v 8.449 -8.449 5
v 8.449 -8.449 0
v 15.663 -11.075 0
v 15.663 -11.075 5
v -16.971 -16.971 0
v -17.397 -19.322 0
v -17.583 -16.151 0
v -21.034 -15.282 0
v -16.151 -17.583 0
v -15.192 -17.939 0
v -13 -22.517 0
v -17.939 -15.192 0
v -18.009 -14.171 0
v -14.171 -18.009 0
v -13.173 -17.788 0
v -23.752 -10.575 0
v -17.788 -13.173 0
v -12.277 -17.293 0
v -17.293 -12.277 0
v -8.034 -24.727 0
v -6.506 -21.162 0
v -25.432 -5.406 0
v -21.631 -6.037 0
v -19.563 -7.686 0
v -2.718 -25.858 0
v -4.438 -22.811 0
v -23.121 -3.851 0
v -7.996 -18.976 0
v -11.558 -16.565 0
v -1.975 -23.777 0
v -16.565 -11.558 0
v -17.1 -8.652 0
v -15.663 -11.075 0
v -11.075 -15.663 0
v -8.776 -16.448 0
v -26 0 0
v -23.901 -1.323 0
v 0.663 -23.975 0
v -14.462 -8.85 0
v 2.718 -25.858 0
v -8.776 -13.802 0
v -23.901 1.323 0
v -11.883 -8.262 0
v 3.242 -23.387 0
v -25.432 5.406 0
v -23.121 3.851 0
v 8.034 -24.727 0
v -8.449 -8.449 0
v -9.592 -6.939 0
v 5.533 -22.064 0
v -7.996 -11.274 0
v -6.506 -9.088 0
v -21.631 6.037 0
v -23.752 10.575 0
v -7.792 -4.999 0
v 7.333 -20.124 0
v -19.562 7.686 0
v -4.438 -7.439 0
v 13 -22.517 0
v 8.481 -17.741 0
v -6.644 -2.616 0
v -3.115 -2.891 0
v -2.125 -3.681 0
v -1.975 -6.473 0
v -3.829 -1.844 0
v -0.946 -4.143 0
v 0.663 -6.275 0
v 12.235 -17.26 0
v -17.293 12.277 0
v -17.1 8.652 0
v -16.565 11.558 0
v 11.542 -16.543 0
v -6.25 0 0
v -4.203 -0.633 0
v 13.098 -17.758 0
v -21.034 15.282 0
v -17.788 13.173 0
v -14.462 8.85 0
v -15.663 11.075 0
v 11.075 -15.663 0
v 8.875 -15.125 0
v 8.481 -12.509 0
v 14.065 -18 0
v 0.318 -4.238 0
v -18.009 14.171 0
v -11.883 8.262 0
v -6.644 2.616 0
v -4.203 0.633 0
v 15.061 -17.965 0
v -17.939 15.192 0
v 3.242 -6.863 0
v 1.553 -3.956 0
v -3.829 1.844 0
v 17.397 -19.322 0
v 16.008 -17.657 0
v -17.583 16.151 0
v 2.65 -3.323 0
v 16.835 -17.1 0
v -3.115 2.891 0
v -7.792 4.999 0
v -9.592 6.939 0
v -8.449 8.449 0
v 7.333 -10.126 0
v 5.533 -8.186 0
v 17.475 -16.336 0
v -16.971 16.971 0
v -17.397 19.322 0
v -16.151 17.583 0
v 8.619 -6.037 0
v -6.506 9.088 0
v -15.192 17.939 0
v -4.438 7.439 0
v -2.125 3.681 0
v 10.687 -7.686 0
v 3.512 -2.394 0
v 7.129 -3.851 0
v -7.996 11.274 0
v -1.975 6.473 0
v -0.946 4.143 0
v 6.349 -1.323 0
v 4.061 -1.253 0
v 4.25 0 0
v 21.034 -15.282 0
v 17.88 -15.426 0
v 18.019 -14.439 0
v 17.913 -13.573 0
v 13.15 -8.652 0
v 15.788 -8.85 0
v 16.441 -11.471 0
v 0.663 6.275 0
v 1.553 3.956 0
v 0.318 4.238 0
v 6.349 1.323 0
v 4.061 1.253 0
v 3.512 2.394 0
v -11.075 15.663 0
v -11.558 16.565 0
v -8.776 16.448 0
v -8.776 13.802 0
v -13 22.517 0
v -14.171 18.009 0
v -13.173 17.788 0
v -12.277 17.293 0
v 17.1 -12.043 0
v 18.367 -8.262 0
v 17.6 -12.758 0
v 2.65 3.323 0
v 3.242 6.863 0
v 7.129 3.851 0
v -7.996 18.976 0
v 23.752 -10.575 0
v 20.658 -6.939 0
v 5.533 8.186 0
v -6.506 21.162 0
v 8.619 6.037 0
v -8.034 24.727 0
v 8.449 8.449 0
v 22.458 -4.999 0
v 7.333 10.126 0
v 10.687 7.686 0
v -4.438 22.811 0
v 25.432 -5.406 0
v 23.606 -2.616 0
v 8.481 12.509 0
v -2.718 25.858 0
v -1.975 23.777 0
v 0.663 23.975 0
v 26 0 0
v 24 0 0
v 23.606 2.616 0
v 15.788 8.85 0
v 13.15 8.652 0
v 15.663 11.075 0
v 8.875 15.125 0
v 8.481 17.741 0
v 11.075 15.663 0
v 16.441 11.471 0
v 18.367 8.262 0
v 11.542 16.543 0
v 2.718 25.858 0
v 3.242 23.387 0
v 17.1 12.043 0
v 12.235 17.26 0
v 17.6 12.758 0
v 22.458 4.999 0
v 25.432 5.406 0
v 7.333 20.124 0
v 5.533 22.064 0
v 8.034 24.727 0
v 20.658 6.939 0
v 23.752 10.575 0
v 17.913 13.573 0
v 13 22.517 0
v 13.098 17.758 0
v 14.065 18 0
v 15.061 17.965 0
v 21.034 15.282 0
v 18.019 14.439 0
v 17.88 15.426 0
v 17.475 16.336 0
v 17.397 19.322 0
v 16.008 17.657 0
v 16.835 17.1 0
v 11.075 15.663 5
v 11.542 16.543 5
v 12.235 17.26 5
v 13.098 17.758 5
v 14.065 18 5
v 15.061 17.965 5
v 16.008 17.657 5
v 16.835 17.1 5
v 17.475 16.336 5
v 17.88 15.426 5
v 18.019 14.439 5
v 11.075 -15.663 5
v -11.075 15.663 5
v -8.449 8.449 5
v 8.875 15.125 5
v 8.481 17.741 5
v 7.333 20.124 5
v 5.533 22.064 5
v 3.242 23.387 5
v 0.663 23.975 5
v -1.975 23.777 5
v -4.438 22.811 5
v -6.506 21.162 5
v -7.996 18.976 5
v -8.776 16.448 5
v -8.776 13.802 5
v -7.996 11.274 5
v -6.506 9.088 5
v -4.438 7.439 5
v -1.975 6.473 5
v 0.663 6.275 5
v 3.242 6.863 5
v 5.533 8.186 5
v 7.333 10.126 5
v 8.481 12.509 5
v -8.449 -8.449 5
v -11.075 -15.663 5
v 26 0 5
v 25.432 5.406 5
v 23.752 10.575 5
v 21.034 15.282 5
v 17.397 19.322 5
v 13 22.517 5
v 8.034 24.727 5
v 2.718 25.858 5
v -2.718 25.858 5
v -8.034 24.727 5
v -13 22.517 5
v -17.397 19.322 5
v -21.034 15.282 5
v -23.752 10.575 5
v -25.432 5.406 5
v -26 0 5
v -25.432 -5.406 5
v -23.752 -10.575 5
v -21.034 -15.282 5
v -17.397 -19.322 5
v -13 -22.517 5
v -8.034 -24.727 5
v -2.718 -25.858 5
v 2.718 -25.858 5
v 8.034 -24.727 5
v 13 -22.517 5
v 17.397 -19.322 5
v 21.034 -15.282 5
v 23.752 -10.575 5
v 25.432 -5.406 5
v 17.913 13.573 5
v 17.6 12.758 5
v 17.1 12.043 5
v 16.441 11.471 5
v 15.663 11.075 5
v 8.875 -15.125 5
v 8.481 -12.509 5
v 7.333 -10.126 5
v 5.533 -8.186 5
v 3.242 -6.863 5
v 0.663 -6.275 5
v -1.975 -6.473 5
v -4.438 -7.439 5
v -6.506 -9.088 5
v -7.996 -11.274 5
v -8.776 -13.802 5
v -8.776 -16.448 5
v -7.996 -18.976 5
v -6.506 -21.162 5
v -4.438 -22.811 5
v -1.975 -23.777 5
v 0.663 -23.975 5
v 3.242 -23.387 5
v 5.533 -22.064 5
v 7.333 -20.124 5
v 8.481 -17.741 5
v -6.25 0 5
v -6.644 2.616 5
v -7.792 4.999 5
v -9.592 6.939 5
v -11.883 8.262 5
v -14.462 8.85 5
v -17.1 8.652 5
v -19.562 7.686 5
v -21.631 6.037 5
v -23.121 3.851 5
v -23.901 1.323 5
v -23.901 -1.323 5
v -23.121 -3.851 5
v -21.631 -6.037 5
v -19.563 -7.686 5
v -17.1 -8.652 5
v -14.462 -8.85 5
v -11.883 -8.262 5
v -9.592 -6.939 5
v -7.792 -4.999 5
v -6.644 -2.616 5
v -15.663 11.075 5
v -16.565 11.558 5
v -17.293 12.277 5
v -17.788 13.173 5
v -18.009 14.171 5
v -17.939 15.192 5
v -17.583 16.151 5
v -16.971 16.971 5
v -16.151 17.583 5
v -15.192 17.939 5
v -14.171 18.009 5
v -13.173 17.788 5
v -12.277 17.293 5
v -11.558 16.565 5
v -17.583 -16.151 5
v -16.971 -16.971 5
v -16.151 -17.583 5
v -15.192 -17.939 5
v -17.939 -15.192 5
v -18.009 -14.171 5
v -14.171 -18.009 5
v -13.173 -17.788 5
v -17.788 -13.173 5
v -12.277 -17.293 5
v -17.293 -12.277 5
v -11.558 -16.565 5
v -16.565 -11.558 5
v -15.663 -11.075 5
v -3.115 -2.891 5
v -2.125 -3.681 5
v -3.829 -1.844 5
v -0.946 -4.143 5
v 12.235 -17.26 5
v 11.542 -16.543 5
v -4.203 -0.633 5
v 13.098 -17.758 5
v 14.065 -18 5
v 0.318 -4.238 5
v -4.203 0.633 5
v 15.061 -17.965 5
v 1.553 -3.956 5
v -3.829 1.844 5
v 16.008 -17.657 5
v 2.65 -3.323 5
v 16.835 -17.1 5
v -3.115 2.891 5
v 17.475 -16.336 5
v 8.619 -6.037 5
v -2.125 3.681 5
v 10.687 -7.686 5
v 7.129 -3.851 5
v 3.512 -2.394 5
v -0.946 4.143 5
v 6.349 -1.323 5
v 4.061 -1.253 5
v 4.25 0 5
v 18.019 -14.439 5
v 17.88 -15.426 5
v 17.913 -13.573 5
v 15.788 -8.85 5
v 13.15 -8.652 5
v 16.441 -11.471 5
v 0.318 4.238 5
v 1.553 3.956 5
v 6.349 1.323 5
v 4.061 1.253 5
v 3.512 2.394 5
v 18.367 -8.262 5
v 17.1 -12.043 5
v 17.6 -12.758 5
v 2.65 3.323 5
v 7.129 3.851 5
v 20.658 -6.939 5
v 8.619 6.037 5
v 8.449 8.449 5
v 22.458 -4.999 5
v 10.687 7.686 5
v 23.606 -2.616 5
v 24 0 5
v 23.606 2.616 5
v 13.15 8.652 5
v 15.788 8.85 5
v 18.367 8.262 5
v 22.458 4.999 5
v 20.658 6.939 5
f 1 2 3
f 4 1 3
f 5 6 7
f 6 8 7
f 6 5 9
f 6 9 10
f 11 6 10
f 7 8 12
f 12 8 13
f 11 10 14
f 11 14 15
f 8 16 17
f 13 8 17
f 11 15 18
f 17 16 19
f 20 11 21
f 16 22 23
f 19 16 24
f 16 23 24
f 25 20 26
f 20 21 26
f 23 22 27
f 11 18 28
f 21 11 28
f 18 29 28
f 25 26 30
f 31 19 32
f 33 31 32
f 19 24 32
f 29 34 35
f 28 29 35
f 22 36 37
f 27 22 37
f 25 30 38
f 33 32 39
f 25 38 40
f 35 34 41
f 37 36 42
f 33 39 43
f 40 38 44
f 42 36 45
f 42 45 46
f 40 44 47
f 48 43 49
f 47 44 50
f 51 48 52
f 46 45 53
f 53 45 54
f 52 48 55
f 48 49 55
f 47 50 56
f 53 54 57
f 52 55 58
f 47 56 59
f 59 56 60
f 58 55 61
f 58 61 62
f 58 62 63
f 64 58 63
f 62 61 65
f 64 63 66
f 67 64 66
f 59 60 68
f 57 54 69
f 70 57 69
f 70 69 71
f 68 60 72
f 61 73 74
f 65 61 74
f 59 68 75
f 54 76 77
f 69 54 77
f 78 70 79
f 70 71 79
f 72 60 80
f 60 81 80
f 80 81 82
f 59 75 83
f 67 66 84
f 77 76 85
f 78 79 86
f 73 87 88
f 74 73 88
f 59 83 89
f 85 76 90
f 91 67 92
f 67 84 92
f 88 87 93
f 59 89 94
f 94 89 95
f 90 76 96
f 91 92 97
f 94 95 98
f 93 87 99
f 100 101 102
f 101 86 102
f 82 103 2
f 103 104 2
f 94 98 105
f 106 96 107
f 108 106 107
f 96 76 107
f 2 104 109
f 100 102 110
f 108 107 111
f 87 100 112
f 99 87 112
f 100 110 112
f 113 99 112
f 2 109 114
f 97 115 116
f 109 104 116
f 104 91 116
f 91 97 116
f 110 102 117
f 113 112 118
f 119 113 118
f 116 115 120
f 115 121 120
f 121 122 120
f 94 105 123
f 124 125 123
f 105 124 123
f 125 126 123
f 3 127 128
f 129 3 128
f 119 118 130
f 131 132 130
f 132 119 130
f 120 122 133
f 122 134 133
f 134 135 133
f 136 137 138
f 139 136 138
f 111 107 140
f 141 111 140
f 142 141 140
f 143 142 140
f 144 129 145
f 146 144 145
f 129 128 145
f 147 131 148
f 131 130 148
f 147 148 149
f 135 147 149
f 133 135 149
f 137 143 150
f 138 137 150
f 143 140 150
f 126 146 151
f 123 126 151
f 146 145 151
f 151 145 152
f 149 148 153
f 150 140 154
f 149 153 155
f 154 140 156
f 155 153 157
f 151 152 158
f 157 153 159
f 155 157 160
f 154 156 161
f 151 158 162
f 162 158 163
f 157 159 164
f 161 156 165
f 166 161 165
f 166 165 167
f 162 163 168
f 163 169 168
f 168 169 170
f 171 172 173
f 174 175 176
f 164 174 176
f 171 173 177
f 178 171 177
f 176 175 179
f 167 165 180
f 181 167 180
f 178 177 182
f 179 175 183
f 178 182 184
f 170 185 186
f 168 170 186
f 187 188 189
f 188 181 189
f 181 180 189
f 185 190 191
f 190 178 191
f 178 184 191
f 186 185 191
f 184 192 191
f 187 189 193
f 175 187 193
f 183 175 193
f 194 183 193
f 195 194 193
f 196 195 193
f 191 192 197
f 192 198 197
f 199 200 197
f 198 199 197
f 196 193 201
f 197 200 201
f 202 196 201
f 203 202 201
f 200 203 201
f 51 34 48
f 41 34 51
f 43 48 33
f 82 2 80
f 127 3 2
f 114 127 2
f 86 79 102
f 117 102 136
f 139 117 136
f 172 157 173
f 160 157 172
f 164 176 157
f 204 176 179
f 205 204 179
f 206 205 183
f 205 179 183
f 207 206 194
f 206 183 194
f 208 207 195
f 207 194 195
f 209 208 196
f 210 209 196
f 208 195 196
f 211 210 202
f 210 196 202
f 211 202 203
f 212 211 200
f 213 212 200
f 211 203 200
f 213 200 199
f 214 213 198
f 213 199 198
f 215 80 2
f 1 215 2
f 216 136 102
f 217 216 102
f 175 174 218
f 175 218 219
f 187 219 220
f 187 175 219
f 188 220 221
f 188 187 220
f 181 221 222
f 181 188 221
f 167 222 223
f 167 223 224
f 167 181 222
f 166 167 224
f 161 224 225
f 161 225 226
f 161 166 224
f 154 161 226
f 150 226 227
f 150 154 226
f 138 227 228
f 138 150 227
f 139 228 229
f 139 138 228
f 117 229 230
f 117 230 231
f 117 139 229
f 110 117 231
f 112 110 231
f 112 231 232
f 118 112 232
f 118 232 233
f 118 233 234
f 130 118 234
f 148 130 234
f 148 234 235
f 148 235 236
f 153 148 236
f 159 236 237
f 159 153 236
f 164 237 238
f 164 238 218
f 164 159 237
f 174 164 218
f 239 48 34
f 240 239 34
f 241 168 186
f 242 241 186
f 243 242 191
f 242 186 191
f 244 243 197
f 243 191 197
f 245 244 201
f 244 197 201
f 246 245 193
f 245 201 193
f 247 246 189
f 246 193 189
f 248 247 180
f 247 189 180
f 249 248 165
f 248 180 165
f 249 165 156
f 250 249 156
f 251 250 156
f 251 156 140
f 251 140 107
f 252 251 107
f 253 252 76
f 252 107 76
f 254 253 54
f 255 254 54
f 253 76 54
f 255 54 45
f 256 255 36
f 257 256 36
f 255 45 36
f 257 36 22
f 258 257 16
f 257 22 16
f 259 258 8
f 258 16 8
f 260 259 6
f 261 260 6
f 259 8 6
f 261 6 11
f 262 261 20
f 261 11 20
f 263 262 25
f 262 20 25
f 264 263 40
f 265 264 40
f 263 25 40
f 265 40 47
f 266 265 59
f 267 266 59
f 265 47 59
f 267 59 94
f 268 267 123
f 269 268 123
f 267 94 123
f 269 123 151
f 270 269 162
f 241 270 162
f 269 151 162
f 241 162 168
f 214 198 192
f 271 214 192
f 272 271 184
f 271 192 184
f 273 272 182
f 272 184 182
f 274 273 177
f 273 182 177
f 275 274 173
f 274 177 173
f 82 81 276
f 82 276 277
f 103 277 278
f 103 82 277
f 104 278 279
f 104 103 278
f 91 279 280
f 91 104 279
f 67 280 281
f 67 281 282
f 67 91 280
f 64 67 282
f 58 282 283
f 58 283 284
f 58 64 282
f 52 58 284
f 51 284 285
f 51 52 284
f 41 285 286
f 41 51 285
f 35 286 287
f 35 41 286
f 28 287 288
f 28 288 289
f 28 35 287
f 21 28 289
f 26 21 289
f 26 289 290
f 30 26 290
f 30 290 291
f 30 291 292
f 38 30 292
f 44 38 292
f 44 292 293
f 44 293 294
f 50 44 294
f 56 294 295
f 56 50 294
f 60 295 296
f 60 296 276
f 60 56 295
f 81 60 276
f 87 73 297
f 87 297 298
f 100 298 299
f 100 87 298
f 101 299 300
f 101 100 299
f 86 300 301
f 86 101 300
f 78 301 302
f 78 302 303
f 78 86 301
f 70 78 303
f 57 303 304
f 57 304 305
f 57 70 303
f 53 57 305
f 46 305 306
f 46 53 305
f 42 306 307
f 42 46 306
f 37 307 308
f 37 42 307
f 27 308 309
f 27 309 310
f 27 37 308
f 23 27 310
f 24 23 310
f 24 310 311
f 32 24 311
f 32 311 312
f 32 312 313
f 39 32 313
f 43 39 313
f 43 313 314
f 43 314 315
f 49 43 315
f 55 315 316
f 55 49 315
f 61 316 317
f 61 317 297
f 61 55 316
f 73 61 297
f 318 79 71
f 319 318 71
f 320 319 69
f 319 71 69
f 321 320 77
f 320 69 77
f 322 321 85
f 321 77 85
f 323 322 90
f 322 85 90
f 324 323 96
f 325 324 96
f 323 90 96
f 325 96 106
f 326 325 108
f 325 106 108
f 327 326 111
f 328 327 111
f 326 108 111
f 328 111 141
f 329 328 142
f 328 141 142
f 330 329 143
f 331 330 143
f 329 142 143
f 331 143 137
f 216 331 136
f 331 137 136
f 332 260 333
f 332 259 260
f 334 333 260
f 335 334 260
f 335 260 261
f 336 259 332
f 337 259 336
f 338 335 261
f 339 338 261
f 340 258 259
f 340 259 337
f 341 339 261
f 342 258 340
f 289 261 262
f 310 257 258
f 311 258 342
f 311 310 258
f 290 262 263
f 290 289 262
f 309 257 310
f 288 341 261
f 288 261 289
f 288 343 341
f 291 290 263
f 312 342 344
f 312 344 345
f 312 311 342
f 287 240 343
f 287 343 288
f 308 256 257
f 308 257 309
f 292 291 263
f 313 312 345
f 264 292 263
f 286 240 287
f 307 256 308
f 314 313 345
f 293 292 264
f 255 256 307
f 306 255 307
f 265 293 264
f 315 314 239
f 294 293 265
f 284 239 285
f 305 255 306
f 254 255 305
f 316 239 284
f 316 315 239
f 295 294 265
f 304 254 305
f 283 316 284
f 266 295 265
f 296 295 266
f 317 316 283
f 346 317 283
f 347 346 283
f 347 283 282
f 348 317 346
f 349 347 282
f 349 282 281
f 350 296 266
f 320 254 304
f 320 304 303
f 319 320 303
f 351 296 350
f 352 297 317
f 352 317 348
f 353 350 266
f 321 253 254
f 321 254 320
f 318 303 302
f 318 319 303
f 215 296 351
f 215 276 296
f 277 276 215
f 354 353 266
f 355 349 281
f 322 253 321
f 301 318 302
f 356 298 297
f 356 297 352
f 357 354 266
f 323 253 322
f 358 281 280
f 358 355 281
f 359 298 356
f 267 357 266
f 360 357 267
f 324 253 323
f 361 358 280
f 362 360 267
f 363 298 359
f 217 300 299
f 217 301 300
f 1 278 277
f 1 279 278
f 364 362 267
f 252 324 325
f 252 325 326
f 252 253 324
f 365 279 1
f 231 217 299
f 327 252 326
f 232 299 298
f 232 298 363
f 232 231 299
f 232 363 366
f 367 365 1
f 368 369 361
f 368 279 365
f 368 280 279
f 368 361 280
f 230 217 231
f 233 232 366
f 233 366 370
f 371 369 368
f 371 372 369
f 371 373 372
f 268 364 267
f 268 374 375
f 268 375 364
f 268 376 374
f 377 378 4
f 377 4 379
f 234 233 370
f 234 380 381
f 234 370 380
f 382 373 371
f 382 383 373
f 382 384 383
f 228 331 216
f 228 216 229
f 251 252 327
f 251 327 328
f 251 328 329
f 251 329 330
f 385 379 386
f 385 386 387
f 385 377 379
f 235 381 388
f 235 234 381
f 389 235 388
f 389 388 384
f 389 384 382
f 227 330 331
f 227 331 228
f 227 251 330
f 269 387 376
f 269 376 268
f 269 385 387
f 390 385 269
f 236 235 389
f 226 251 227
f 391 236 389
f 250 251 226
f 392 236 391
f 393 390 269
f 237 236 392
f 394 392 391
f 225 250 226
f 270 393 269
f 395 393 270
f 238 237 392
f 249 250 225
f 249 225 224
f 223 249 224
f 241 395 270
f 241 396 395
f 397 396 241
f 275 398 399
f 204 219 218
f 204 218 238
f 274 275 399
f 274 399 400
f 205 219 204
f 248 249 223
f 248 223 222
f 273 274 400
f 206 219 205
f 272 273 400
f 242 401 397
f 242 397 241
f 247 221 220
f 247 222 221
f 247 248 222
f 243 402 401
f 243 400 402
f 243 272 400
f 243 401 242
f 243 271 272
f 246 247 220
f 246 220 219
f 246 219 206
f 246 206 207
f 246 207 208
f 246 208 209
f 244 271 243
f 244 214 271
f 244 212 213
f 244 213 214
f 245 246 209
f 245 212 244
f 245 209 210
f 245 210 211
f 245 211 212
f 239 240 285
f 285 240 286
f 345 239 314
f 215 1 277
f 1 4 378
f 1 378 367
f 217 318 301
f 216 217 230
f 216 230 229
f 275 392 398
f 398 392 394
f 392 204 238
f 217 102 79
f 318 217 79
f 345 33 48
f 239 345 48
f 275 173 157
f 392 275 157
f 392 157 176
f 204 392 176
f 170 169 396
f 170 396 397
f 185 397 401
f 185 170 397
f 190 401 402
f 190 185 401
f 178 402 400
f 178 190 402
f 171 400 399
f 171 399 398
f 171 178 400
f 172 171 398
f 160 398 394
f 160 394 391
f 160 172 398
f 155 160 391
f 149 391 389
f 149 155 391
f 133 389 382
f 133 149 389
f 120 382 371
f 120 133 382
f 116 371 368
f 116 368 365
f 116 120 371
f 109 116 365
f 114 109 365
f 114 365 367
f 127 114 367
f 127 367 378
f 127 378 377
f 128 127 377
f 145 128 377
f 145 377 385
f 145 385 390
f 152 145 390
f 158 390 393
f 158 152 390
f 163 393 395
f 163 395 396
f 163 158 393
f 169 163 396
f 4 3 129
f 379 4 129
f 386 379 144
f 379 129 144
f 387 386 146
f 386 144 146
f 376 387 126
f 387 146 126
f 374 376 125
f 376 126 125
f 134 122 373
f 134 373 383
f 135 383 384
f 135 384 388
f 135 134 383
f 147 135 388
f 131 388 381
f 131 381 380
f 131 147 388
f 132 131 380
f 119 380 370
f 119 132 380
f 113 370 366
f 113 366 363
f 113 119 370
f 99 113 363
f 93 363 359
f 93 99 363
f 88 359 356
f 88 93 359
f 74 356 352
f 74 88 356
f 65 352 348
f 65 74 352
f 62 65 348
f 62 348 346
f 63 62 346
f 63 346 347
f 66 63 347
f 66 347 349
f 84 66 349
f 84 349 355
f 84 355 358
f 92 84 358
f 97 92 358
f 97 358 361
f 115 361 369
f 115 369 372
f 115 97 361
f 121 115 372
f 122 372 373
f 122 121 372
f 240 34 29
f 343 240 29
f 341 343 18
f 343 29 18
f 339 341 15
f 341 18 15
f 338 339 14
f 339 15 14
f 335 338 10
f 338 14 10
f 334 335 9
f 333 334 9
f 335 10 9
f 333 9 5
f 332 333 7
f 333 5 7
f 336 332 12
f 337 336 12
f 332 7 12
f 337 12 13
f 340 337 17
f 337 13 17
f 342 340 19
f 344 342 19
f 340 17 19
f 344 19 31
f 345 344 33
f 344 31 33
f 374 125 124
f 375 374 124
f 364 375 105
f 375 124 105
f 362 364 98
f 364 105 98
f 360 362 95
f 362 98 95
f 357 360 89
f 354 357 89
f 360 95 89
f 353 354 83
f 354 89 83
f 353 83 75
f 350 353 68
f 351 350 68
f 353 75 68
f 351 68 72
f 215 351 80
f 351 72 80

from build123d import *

# Parameters (mm, degrees)
F0_R     = 26
F0_R_2   = 8.875
F0_R_3   = 4.25
F1_DEPTH = 5


with BuildPart() as f1:
    # F0 (on Top) → F1 (new body)
    with BuildSketch(Plane.XY):
        Circle(F0_R)
        with BuildLine():
            ThreePointArc((-11.074626, -15.663465), (-16.970563, -16.970563), (-15.663465, -11.074626))
            Line((-15.663465, -11.074626), (-8.448647, -8.448647))
            Line((-8.448647, -8.448647), (-11.074626, -15.663465))
        make_face(mode=Mode.SUBTRACT)
        with Locations((0, -15.125)):
            Circle(F0_R_2, mode=Mode.SUBTRACT)
        with BuildLine():
            Line((11.074626, -15.663465), (8.448647, -8.448647))
            Line((8.448647, -8.448647), (15.663465, -11.074626))
            ThreePointArc((15.663465, -11.074626), (17.371712, -12.385409), (18.019191, -14.438951))
            ThreePointArc((18.019191, -14.438951), (15.060653, -17.964799), (11.074626, -15.663465))
        make_face(mode=Mode.SUBTRACT)
        with Locations((-15.125, 0)):
            Circle(F0_R_2, mode=Mode.SUBTRACT)
        with BuildLine():
            ThreePointArc((-15.663465, 11.074626), (-16.970563, 16.970563), (-11.074626, 15.663465))
            Line((-11.074626, 15.663465), (-8.448647, 8.448647))
            Line((-8.448647, 8.448647), (-15.663465, 11.074626))
        make_face(mode=Mode.SUBTRACT)
        Circle(F0_R_3, mode=Mode.SUBTRACT)
        with Locations((15.125, 0)):
            Circle(F0_R_2, mode=Mode.SUBTRACT)
        with Locations((0, 15.125)):
            Circle(F0_R_2, mode=Mode.SUBTRACT)
        with BuildLine():
            Line((15.663465, 11.074626), (8.448647, 8.448647))
            Line((8.448647, 8.448647), (11.074626, 15.663465))
            ThreePointArc((11.074626, 15.663465), (15.060653, 17.964799), (18.019191, 14.438951))
            ThreePointArc((18.019191, 14.438951), (17.371712, 12.385409), (15.663465, 11.074626))
        make_face(mode=Mode.SUBTRACT)
    extrude(amount=F1_DEPTH)


solid = f1.part
